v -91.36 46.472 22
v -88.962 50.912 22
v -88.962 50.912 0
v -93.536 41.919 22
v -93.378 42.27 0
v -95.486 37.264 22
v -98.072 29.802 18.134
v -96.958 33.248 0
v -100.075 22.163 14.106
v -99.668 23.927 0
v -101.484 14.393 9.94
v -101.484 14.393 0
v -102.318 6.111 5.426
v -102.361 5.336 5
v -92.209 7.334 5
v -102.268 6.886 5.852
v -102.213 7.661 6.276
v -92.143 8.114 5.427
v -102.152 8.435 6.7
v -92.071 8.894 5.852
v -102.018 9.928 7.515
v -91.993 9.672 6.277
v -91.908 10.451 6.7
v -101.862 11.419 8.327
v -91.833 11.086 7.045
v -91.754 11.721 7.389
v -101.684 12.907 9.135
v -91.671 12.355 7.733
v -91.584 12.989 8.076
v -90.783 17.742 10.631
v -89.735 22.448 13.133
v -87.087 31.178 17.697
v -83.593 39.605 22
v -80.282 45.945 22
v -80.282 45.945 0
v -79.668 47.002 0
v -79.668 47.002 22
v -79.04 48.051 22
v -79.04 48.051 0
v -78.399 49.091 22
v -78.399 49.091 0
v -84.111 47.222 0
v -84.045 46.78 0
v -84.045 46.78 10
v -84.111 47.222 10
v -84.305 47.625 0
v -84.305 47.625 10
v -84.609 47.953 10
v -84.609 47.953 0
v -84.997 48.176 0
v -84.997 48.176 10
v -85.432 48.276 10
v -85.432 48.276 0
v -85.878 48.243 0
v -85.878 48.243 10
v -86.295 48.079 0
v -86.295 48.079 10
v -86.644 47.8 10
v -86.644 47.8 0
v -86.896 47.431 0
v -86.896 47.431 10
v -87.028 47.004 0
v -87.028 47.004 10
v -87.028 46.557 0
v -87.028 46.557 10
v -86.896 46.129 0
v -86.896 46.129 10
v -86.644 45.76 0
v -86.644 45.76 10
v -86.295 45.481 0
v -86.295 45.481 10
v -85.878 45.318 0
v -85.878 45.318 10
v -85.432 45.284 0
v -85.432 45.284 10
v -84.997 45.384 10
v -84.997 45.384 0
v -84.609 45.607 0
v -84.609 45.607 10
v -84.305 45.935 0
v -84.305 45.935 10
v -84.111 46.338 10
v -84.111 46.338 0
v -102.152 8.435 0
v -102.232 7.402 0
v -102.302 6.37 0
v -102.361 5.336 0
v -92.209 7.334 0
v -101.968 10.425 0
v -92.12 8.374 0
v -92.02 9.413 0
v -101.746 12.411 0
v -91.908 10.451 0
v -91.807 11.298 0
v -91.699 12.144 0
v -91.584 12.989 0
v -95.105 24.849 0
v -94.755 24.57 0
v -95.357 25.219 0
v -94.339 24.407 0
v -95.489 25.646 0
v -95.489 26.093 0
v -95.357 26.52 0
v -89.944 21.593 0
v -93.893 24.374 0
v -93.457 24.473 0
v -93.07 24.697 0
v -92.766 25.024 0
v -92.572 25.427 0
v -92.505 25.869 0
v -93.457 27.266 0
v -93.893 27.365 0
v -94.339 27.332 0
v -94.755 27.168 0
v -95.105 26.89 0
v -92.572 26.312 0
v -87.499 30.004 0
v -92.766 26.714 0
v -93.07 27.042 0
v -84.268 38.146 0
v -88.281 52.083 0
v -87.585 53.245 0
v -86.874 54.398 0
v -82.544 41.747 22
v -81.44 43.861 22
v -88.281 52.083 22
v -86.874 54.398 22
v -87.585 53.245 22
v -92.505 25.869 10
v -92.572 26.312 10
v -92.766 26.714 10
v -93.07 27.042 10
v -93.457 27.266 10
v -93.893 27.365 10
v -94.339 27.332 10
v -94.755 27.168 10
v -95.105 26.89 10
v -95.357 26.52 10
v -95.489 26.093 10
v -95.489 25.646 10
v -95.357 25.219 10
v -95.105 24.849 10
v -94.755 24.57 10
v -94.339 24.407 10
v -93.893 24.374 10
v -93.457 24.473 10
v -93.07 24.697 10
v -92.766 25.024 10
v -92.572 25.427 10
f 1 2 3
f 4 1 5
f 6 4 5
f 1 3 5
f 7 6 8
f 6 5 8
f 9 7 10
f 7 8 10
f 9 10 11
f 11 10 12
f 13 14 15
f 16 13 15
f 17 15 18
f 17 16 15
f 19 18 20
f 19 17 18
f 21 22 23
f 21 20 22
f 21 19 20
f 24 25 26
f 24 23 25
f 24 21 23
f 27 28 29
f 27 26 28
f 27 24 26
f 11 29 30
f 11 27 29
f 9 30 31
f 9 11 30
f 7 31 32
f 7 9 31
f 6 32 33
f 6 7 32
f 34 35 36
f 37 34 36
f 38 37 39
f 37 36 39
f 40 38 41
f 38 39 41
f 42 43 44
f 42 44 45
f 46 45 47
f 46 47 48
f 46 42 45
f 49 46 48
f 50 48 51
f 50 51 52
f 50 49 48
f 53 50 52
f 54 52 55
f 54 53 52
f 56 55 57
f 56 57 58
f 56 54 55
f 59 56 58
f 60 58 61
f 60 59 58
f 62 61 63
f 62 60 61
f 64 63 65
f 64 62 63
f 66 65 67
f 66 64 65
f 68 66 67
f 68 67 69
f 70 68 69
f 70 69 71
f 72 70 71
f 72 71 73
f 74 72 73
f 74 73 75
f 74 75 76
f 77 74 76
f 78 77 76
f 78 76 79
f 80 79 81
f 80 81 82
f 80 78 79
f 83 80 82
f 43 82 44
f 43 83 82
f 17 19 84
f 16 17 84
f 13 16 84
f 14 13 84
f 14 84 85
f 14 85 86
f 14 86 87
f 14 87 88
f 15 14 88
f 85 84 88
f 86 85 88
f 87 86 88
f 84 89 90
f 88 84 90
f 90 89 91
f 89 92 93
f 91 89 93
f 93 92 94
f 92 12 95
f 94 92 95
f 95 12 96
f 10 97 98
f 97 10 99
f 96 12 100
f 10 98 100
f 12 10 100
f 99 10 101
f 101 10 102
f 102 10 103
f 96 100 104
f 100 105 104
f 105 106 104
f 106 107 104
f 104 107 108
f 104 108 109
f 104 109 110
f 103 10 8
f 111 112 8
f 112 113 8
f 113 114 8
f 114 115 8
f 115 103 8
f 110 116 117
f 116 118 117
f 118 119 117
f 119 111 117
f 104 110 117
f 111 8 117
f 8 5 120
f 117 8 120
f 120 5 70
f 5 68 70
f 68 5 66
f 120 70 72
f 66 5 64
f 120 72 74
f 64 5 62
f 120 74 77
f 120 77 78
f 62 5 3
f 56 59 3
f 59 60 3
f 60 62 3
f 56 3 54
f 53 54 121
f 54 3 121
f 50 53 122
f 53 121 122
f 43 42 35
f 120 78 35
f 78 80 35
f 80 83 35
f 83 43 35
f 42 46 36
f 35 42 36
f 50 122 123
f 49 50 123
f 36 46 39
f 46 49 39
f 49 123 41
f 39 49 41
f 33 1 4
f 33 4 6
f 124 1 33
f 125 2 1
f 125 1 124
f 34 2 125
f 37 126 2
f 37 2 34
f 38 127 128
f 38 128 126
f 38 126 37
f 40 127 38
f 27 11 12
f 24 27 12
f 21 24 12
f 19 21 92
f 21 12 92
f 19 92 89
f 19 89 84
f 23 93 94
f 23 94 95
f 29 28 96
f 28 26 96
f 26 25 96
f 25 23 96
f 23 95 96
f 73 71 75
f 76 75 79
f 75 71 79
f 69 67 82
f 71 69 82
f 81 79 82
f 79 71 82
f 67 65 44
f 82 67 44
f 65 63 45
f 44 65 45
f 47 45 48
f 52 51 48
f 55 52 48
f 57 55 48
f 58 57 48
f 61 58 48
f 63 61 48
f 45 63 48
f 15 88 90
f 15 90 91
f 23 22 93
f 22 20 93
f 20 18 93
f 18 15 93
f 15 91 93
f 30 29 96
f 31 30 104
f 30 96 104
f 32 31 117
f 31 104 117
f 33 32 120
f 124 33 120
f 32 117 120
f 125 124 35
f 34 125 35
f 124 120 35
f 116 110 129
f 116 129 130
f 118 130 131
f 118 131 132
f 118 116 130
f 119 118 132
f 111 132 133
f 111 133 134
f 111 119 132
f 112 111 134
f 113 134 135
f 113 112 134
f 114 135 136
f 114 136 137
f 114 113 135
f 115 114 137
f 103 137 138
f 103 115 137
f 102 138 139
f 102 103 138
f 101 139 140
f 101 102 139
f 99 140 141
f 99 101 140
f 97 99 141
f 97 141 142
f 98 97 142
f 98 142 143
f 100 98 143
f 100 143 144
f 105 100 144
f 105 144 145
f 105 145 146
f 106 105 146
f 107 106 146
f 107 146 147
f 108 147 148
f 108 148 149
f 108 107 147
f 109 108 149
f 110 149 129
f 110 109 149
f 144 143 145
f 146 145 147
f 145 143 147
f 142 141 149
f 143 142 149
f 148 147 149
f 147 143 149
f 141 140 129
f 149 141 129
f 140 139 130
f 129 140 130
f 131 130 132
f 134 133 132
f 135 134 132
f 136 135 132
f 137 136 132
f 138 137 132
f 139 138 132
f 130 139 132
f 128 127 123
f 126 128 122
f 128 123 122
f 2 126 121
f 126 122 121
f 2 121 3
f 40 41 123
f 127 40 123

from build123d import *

# Parameters (mm, degrees)
F0_R        = 1.5
F1_DEPTH    = 22
F2_T1_DEPTH = 165.5952281179
F3_DEPTH    = 10


# Not quite as in the source:
# - a fillet or chamfer that OpenCascade refuses, or shapes differently, is made with other operations: its cross-section is extruded or revolved along the edge and cut away or added


with BuildPart() as f1:
    # F0 (on Top) → F1 (new body)
    with BuildSketch(Plane.XY):
        with BuildLine():
            ThreePointArc((-92.2088082298, 7.3338724312), (-92.0714667591, 8.8935374755), (-91.9077462525, 10.4506544671))
            Line((-91.9077462525, 10.4506544671), (-102.1523712509, 8.4346338282))
            ThreePointArc((-102.1523712509, 8.4346338282), (-102.2684274731, 6.8861267905), (-102.3610115463, 5.3360392827))
            Line((-102.3610115463, 5.3360392827), (-92.2088082298, 7.3338724312))
        make_face()
        with BuildLine():
            ThreePointArc((-91.5835416646, 12.9886448933), (-87.4986604127, 30.0039068455), (-80.2824351959, 45.9454089003))
            Line((-80.2824351959, 45.9454089003), (-88.9616173792, 50.9124801328))
            ThreePointArc((-88.9616173792, 50.9124801328), (-96.9579750519, 33.2475724504), (-101.4844650878, 14.3928227196))
            Line((-101.4844650878, 14.3928227196), (-91.5835416646, 12.9886448933))
        make_face()
        with Locations((-94.0054339813, 25.8694488148)):
            Circle(F0_R, mode=Mode.SUBTRACT)
        with Locations((-85.5445299814, 46.7801602206)):
            Circle(F0_R, mode=Mode.SUBTRACT)
        with BuildLine():
            ThreePointArc((-80.2824351959, 45.9454089003), (-79.3561481615, 47.5273789407), (-78.3986924261, 49.0906816603))
            Line((-78.3986924261, 49.0906816603), (-86.8742267425, 54.3977823804))
            ThreePointArc((-86.8742267425, 54.3977823804), (-87.935191206, 52.6654739613), (-88.9616173792, 50.9124801328))
            Line((-88.9616173792, 50.9124801328), (-80.2824351959, 45.9454089003))
        make_face()
        with BuildLine():
            ThreePointArc((-91.9077462525, 10.4506544671), (-91.7544196986, 11.720770699), (-91.5835416646, 12.9886448933))
            Line((-91.5835416646, 12.9886448933), (-101.4844650878, 14.3928227196))
            ThreePointArc((-101.4844650878, 14.3928227196), (-101.8619913522, 11.4186127778), (-102.1523712509, 8.4346338282))
            Line((-102.1523712509, 8.4346338282), (-91.9077462525, 10.4506544671))
        make_face()
        with Locations((-85.5445299814, 46.7801602206)):
            Circle(F0_R)
        with Locations((-94.0054339813, 25.8694488148)):
            Circle(F0_R)
    extrude(amount=F1_DEPTH)

    # F2: chamfer of 17 x 30 on 1 edges, made by hand

    # F2_s2 → F2_t1 (cut)
    with BuildSketch(Plane(origin=(-173.6973169445, -34.1815709152, 0), x_dir=(0, 0, 1), z_dir=(0.9811820369, 0.1930849823, 0))):
        Polygon((5, -25), (22, -55), (22, -25), align=None)
    extrude(amount=F2_T1_DEPTH, mode=Mode.SUBTRACT)

    # F0 (on Top) → F3 (cut)
    with BuildSketch(Plane.XY):
        with Locations((-85.5445299814, 46.7801602206)):
            Circle(F0_R)
        with Locations((-94.0054339813, 25.8694488148)):
            Circle(F0_R)
    extrude(amount=F3_DEPTH, mode=Mode.SUBTRACT)


solid = f1.part
